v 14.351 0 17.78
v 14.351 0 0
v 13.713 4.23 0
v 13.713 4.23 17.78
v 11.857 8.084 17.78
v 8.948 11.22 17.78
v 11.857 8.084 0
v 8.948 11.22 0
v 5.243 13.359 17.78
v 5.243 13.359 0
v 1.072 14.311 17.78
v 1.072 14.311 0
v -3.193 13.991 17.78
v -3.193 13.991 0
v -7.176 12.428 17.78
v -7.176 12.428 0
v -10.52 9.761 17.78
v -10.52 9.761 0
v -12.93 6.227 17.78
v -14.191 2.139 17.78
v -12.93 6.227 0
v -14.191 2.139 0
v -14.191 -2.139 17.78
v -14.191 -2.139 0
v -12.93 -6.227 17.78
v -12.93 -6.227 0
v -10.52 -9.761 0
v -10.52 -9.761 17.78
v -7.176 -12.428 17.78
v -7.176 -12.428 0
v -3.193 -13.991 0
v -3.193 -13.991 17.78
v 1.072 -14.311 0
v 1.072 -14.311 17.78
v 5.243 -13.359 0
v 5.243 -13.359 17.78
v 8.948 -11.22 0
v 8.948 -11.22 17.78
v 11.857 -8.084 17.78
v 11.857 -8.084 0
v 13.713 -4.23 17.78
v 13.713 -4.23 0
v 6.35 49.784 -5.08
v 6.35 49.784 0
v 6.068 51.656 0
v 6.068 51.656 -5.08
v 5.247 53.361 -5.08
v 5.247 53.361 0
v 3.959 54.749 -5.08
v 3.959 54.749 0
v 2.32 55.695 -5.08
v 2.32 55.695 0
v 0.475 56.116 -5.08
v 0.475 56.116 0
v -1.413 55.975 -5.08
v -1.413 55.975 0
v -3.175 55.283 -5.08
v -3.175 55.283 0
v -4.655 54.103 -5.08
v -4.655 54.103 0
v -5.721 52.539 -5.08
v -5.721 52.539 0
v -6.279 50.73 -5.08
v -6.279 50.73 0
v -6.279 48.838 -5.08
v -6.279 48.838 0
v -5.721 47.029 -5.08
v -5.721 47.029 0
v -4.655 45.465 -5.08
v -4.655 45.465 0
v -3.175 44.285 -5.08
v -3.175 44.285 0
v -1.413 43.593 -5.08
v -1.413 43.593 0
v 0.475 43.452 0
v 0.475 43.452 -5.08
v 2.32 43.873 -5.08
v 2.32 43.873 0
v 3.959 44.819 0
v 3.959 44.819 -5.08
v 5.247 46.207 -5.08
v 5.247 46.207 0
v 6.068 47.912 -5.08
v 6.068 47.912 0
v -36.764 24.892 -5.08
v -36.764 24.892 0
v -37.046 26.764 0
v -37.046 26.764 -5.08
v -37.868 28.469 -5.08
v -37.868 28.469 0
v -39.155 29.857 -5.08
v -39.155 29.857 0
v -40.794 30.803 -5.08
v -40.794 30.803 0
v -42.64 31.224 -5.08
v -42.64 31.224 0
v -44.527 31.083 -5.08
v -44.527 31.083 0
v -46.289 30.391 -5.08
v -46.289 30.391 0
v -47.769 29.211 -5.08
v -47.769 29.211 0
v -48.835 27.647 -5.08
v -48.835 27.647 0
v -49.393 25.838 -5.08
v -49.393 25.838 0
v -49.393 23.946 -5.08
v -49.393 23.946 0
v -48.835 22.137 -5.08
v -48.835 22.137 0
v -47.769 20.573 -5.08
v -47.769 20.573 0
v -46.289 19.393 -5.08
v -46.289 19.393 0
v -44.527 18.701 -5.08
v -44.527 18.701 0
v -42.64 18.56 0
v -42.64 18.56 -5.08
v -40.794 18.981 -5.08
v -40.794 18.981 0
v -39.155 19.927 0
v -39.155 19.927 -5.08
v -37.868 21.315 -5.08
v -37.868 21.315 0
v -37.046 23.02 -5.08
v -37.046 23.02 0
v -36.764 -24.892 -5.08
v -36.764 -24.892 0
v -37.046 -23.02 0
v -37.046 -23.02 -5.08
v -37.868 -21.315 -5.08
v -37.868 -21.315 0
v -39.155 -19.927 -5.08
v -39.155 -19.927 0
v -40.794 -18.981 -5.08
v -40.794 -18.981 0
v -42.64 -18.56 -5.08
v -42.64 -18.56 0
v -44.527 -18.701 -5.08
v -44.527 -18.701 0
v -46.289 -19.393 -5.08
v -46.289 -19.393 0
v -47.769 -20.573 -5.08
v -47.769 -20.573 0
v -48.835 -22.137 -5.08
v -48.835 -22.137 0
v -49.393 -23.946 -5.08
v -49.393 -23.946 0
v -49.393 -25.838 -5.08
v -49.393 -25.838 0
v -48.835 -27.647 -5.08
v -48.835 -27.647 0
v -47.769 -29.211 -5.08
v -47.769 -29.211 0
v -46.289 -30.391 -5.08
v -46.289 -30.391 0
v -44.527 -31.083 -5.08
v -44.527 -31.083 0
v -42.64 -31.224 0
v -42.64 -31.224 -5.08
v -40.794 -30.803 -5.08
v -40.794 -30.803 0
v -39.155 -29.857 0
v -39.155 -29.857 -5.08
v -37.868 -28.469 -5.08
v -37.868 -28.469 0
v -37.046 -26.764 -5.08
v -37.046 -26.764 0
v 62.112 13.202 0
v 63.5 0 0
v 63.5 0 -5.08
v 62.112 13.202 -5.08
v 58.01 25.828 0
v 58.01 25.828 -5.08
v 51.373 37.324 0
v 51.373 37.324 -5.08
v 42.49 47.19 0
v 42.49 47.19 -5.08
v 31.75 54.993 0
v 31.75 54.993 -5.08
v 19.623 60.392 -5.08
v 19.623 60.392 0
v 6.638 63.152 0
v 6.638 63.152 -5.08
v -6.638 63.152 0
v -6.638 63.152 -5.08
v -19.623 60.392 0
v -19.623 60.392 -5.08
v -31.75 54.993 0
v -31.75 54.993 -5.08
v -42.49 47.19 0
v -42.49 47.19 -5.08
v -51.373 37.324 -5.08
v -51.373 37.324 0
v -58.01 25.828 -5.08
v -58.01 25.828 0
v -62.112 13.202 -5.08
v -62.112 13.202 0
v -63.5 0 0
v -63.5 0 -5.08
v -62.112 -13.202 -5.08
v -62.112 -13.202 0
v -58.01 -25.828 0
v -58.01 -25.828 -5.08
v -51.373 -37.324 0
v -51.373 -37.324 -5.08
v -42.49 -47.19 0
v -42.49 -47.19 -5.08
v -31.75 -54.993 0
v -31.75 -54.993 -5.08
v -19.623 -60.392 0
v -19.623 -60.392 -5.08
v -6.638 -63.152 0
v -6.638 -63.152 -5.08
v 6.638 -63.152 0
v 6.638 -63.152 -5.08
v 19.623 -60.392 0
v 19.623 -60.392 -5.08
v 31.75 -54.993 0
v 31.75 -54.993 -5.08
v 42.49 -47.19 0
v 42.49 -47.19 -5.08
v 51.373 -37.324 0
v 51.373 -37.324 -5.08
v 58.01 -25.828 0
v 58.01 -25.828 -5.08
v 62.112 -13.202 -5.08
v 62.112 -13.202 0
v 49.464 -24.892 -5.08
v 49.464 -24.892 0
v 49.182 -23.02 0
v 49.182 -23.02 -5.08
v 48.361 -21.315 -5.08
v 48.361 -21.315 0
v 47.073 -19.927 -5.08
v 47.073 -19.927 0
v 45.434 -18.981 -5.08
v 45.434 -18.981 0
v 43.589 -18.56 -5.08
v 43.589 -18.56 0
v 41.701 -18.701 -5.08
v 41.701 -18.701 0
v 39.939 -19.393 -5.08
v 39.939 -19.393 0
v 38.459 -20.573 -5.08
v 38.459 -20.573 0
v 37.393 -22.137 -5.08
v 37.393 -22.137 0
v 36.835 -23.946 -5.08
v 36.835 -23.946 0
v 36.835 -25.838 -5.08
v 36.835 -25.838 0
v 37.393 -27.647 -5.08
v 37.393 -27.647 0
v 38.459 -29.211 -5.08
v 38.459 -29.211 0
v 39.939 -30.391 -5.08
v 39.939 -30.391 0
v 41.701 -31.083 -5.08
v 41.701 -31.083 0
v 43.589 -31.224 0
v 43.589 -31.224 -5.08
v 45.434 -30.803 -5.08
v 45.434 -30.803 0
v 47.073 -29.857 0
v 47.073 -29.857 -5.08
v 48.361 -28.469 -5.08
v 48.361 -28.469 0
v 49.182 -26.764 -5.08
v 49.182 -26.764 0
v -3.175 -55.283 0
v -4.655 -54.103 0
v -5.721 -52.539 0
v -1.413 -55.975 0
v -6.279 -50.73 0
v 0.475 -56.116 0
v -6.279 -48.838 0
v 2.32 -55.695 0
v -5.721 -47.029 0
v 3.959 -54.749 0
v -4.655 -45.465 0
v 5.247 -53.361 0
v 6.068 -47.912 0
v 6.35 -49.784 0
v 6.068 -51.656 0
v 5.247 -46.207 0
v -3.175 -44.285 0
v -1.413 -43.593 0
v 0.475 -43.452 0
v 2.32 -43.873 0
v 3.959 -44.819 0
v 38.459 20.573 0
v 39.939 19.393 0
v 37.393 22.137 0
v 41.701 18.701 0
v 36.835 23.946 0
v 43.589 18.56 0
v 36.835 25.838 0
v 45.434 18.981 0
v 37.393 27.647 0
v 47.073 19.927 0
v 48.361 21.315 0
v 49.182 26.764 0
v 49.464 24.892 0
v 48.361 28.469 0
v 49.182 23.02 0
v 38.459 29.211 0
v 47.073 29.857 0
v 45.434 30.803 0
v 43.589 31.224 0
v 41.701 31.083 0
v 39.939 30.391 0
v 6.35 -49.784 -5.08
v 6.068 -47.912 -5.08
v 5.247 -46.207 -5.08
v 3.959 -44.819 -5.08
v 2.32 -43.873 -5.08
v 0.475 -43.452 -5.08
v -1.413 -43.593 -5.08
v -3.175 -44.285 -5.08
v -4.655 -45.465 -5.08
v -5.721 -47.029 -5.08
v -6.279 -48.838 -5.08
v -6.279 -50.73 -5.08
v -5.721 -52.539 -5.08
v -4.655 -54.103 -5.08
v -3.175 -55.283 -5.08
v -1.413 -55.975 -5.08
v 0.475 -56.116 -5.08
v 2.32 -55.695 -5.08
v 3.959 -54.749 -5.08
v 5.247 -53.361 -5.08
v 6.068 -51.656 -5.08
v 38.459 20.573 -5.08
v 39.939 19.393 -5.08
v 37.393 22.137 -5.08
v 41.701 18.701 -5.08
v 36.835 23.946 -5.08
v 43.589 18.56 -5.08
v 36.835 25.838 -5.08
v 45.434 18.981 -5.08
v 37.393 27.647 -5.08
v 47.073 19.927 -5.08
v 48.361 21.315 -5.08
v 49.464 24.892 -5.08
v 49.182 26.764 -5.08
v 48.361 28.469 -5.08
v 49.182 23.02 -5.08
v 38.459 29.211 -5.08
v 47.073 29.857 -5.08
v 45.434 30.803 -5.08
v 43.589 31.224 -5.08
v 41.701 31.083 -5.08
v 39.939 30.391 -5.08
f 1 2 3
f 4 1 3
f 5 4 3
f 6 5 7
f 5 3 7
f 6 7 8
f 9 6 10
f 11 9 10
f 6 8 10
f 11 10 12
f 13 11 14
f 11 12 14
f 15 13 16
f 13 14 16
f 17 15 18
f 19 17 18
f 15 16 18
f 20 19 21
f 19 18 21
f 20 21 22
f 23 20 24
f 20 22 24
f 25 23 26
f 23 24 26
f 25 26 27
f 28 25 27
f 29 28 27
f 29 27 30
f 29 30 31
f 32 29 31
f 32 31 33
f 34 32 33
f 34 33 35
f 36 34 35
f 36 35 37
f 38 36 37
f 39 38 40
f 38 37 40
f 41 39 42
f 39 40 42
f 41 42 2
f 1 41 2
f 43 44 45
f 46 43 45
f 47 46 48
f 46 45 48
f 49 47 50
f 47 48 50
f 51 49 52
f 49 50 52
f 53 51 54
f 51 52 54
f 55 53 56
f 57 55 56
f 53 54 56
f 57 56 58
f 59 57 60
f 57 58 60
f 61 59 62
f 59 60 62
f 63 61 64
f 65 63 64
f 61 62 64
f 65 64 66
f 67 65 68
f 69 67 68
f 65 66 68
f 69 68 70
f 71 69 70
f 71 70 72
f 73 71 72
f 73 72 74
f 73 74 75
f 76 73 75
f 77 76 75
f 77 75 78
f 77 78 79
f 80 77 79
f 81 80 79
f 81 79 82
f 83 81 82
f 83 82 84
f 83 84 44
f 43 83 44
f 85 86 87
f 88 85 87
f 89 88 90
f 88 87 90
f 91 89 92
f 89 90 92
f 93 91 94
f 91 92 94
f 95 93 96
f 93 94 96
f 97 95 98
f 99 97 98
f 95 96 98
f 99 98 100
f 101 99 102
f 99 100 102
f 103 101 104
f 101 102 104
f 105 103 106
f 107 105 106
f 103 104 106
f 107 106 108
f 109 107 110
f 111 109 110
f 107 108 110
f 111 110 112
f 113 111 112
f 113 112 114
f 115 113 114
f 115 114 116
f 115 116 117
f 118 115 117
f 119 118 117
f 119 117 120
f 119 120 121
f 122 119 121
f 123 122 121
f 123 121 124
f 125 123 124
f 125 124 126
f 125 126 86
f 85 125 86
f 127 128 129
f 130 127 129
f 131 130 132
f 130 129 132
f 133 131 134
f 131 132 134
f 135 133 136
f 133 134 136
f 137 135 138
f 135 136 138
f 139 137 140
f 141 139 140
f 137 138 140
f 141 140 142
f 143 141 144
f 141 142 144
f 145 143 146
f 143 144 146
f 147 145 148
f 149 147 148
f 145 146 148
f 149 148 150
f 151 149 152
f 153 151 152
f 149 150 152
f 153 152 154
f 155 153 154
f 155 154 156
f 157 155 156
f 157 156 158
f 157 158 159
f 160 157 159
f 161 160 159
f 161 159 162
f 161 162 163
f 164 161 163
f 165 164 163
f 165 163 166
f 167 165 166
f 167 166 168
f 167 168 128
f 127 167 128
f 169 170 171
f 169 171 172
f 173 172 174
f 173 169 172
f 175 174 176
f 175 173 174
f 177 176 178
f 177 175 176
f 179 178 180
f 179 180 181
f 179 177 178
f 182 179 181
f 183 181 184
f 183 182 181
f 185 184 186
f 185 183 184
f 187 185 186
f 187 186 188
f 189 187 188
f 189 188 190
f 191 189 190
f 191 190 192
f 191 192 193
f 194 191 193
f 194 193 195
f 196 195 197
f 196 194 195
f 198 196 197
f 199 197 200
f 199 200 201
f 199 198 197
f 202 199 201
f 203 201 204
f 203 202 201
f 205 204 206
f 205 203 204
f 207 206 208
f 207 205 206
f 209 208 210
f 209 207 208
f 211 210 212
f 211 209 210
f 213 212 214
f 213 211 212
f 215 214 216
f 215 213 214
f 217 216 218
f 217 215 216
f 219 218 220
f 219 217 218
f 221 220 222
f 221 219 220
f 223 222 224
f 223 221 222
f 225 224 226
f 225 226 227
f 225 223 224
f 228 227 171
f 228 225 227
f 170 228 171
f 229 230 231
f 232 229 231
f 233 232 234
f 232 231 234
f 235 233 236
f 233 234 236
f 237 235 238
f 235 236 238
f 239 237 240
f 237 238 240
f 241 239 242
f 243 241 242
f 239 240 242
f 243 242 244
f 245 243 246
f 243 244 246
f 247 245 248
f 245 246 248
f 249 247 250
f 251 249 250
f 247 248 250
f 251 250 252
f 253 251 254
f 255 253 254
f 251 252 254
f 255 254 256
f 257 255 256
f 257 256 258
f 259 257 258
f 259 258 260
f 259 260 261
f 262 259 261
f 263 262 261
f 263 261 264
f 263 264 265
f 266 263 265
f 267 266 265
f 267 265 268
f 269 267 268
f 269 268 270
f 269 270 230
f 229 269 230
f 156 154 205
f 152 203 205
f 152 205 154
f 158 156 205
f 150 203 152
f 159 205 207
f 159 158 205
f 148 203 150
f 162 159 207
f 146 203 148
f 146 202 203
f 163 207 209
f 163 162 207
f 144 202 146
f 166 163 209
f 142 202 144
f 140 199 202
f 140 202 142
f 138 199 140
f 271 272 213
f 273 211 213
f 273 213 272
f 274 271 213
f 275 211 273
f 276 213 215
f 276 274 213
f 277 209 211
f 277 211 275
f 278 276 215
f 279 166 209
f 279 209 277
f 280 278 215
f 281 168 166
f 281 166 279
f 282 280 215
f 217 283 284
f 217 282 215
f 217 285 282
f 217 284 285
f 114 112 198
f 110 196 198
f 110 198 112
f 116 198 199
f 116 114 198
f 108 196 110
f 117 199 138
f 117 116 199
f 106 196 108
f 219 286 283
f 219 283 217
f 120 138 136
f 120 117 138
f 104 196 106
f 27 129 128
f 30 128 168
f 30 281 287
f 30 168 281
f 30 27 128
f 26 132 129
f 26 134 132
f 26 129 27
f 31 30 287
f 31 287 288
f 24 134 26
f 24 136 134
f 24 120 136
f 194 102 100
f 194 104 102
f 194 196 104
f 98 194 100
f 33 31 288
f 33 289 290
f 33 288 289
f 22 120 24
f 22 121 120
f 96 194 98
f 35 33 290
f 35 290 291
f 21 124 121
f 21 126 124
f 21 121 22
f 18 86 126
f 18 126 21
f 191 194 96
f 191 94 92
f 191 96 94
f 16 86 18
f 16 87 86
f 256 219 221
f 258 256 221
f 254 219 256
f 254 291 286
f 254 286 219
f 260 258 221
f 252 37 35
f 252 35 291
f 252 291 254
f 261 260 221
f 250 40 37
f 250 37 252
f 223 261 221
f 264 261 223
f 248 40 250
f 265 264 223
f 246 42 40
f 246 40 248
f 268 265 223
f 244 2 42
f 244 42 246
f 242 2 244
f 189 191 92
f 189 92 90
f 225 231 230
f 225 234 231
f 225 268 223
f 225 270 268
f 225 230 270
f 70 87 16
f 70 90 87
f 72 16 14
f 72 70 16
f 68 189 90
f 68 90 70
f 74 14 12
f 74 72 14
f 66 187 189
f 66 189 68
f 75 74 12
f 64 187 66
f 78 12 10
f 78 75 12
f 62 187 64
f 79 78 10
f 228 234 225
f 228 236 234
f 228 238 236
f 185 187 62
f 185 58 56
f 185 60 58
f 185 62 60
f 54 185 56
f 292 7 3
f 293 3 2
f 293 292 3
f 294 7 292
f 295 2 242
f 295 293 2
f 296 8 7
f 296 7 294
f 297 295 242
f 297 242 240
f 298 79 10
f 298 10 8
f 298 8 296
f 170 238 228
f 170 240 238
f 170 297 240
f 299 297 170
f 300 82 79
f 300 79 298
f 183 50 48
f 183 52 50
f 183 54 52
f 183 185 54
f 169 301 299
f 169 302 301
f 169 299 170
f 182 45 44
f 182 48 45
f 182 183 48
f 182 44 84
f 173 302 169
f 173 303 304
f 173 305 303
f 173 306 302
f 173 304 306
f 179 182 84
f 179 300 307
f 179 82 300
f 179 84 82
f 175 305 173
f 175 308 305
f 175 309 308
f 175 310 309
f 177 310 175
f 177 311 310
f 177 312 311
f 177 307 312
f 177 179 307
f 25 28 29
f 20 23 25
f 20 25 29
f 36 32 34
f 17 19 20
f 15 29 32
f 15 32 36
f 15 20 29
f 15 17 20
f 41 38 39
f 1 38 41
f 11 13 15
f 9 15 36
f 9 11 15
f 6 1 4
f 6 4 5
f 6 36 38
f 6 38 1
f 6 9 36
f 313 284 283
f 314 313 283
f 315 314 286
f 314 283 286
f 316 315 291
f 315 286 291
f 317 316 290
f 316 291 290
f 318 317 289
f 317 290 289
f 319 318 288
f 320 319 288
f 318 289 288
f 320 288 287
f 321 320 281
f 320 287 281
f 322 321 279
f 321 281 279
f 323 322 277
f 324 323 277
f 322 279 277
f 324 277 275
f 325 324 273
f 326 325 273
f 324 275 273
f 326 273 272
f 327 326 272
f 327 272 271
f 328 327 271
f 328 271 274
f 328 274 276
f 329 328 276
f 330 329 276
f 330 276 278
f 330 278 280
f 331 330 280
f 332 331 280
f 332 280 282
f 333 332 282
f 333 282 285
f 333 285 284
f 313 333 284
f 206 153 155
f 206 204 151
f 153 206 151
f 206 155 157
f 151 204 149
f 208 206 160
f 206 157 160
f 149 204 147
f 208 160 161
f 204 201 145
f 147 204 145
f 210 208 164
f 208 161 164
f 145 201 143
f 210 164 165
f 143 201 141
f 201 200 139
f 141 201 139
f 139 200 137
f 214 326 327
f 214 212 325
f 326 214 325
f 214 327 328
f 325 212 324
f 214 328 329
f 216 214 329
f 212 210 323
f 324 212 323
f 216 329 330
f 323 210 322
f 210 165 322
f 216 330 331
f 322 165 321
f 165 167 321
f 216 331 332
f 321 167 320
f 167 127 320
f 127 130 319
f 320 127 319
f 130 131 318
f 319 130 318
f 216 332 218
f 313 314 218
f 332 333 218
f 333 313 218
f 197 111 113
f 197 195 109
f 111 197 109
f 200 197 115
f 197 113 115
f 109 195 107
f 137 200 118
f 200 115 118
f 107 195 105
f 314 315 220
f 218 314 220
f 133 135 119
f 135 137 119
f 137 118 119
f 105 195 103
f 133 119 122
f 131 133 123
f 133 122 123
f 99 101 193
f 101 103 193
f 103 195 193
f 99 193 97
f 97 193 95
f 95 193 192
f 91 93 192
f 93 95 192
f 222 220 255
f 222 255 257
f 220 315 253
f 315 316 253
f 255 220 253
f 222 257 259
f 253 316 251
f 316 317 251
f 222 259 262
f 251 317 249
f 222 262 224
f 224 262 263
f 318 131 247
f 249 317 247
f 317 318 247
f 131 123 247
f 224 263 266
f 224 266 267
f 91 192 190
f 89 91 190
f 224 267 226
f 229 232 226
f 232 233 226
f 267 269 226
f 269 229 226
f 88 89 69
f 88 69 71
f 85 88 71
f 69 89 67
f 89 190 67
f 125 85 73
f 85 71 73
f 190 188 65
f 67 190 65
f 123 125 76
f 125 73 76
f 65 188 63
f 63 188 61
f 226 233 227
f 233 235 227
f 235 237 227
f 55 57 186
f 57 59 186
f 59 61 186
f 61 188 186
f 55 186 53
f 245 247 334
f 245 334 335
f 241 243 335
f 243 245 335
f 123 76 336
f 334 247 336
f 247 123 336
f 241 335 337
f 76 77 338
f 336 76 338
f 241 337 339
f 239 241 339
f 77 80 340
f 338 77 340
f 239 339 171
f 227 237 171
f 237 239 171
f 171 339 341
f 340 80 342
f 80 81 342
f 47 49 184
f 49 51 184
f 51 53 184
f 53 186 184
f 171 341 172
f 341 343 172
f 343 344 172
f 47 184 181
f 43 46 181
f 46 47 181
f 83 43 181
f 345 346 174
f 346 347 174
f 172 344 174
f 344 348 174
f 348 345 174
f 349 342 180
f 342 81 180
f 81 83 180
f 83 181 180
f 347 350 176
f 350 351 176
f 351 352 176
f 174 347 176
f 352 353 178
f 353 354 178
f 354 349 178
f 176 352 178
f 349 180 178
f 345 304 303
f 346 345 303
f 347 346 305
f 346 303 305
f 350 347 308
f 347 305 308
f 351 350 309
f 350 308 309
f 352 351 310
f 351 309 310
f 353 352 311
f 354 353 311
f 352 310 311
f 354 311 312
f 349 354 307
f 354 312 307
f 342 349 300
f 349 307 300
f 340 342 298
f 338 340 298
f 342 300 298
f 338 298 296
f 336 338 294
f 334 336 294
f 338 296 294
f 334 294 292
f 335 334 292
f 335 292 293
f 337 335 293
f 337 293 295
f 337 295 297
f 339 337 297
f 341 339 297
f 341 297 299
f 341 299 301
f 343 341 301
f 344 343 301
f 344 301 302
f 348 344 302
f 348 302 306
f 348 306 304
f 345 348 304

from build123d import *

# Parameters (mm, degrees)
SKETCH4_R           = 63.5
BOSS_EXTRUDE1_DEPTH = 5.08
SKETCH5_R           = 14.351
BOSS_EXTRUDE2_DEPTH = 17.78
SKETCH6_R           = 6.35
CUT_EXTRUDE1_DEPTH  = 17.78


with BuildPart() as part:
    # Sketch4 → Boss-Extrude1 (new body)
    with BuildSketch(Plane.XY):
        Circle(SKETCH4_R)
    extrude(amount=-BOSS_EXTRUDE1_DEPTH)

    # Sketch5 → Boss-Extrude2 (add)
    with BuildSketch(Plane.XY):
        Circle(SKETCH5_R)
    extrude(amount=BOSS_EXTRUDE2_DEPTH)

    # Sketch6 → Cut-Extrude1 (cut)
    with BuildSketch(Plane.XY):
        with Locations((0, 49.784)):
            Circle(SKETCH6_R)
        with Locations((43.114208702, 24.892)):
            Circle(SKETCH6_R)
        with Locations((43.114208702, -24.892)):
            Circle(SKETCH6_R)
        with Locations((0, -49.784)):
            Circle(SKETCH6_R)
        with Locations((-43.114208702, -24.892)):
            Circle(SKETCH6_R)
        with Locations((-43.114208702, 24.892)):
            Circle(SKETCH6_R)
    extrude(amount=-CUT_EXTRUDE1_DEPTH, mode=Mode.SUBTRACT)


solid = part.part
